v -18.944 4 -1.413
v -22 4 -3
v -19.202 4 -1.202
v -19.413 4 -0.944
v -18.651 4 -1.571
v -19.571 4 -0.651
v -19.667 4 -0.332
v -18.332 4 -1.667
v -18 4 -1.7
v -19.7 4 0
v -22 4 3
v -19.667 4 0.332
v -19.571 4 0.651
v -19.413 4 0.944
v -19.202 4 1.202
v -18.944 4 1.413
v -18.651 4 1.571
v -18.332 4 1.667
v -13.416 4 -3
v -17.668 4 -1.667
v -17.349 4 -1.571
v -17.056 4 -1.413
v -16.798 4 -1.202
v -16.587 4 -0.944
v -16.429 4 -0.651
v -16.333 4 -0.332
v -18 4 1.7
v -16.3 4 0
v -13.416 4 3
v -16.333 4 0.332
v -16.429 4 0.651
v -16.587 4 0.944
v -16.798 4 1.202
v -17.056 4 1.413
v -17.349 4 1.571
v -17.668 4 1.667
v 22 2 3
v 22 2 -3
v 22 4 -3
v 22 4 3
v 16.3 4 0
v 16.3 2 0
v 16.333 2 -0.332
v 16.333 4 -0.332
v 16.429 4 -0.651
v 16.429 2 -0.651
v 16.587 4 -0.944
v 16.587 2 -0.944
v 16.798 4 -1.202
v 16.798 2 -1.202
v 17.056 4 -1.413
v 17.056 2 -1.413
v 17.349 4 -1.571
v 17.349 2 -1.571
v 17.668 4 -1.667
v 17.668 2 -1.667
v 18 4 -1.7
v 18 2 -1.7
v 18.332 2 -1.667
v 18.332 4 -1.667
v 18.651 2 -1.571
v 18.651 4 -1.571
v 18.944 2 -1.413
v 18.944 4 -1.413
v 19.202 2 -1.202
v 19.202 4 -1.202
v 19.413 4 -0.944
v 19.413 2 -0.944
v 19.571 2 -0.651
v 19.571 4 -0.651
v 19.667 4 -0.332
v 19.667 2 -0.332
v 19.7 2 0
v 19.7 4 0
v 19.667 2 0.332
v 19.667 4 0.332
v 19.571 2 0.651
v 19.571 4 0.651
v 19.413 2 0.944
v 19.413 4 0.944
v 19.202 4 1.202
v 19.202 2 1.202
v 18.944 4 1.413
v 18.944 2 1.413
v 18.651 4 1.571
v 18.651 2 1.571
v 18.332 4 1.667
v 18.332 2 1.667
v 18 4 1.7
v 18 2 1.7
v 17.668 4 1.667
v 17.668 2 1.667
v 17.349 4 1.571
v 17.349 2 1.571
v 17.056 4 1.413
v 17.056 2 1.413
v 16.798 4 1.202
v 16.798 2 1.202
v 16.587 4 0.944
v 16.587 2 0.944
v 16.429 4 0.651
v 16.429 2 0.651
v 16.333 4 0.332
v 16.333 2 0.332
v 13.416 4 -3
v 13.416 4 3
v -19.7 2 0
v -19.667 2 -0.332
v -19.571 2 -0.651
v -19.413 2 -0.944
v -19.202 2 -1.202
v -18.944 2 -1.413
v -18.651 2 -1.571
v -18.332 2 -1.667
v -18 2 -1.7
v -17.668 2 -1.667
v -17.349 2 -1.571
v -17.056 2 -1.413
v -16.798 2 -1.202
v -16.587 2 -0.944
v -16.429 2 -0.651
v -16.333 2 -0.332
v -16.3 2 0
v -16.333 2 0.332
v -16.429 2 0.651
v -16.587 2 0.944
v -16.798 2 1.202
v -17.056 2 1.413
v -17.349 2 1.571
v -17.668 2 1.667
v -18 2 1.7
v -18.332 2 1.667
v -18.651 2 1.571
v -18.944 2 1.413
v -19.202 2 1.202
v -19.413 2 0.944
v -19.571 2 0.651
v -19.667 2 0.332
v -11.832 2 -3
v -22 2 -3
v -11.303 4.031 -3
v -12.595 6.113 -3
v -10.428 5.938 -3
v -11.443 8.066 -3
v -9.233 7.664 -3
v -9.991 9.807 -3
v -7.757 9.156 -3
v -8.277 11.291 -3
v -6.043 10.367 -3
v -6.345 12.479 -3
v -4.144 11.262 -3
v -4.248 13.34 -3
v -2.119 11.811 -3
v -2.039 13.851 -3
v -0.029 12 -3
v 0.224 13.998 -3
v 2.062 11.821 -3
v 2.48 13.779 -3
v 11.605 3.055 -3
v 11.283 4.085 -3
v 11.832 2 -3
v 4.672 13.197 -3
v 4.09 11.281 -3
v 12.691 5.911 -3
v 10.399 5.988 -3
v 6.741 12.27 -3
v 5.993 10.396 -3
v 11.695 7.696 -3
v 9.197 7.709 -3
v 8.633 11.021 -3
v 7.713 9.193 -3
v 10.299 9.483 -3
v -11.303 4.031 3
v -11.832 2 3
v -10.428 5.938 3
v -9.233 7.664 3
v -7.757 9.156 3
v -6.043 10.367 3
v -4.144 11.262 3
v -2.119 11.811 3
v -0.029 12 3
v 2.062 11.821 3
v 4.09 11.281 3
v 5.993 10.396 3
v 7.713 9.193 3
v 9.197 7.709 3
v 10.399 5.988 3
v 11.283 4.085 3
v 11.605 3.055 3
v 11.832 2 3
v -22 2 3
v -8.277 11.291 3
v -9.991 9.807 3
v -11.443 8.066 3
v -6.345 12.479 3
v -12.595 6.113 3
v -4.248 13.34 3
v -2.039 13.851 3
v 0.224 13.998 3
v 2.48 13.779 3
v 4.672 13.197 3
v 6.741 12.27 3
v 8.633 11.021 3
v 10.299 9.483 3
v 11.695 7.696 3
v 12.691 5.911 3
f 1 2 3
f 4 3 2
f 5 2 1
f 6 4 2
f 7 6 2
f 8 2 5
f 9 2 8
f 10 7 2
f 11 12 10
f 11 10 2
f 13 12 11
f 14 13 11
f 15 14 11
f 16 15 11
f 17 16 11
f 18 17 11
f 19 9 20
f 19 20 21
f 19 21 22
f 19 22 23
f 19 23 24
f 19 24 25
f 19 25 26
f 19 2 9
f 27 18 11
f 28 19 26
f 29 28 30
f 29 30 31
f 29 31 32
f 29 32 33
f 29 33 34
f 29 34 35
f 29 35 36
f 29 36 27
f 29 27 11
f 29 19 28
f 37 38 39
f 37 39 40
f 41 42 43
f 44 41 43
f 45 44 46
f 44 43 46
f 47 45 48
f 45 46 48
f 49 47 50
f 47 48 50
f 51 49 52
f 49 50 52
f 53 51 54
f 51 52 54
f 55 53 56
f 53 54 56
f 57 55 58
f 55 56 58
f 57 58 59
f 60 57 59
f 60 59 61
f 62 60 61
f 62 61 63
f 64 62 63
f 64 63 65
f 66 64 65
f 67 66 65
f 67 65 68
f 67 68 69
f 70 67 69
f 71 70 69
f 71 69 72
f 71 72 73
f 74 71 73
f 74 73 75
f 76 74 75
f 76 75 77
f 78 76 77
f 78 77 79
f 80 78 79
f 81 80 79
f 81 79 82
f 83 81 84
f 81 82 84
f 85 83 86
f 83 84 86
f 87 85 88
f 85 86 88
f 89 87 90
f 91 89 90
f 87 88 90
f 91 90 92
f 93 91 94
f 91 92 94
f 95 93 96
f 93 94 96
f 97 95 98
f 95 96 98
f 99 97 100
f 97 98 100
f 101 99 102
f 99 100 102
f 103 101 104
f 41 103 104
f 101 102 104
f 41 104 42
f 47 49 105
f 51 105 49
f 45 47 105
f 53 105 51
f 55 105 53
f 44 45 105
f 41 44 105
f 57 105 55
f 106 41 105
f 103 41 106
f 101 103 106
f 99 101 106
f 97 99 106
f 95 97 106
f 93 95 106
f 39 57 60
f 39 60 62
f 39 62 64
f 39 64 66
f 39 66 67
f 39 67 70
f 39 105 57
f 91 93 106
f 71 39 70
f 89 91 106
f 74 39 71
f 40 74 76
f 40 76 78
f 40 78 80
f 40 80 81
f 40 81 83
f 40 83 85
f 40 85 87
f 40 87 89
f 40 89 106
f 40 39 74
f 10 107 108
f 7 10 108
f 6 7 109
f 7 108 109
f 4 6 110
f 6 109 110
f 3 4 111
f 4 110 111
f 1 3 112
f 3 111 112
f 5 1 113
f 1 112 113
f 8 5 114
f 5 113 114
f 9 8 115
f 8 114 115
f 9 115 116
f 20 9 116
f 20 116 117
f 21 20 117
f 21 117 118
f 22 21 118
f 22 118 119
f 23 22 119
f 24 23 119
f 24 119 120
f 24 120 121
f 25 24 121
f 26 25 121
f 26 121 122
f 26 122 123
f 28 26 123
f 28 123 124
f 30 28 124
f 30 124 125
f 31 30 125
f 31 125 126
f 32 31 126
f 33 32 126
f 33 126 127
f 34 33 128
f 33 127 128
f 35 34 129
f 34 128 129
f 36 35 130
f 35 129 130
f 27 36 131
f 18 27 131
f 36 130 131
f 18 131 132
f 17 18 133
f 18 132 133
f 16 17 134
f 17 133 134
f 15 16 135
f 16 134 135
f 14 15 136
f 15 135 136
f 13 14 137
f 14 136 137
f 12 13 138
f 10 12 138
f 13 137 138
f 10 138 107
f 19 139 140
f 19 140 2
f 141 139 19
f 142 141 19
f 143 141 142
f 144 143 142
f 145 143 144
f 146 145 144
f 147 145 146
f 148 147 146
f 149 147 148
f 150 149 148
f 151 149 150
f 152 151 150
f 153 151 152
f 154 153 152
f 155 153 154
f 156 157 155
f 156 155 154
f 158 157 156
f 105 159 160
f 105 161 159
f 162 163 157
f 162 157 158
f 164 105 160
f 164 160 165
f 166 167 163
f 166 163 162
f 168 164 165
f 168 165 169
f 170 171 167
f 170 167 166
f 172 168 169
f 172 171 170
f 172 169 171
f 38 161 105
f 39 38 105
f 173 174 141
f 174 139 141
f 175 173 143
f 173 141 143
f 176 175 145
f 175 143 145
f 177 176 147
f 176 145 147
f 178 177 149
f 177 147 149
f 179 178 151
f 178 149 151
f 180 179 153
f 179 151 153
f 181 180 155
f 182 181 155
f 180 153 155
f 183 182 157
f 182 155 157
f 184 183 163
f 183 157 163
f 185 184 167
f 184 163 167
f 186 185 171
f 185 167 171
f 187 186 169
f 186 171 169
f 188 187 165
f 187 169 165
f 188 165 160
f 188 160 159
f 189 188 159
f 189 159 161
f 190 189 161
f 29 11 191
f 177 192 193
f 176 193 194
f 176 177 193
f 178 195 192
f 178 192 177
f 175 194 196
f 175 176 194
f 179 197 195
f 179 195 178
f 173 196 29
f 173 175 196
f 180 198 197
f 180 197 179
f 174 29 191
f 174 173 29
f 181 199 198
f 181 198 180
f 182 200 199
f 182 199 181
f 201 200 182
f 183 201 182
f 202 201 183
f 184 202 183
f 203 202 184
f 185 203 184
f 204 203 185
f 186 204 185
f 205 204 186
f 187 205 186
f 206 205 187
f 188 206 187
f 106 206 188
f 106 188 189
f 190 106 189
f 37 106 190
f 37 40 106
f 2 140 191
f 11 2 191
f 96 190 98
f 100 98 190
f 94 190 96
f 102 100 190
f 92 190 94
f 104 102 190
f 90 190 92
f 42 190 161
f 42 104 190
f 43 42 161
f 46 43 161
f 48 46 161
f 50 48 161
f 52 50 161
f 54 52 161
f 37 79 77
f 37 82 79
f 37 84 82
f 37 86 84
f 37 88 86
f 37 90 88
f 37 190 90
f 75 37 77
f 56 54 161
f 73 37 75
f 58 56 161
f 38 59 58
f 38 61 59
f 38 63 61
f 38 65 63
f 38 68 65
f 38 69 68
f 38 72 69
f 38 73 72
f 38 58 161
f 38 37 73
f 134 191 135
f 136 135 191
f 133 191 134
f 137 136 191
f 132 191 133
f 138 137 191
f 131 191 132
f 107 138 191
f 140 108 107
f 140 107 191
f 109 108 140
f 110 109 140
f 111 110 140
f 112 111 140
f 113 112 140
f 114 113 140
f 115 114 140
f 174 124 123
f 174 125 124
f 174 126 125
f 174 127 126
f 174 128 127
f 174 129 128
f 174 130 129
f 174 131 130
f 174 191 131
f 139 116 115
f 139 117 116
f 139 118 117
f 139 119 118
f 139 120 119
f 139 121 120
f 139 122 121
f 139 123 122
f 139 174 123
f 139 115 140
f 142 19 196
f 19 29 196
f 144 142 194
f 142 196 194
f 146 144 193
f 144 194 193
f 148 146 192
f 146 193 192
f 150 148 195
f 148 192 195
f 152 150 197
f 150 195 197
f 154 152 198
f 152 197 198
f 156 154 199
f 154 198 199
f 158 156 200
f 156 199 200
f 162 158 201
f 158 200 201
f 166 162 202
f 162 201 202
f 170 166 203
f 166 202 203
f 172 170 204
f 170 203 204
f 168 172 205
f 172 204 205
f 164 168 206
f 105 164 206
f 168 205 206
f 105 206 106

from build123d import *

# Parameters (mm, degrees)
SKETCH_2_W         = 6
SKETCH_2_H         = 2
HOLE_WIZARD_M3_1_D = 3.4


with BuildPart() as part:
    # 掃出1: sweep along a path in 草圖1
    with BuildLine(Plane.XY) as sweep_1_path:
        Line((-22, 2), (-11.832159566, 2))
        ThreePointArc((-11.832159566, 2), (0, 12), (11.832159566, 2))
        Line((11.832159566, 2), (22, 2))
    # 草圖2 → 掃出1 (sweep)
    with BuildSketch(Plane(origin=(22, 0, 0), x_dir=(0, 0, -1), z_dir=(1, 0, 0))):
        with Locations((0, 3)):
            Rectangle(SKETCH_2_W, SKETCH_2_H)
    sweep(path=sweep_1_path.line, transition=Transition.RIGHT)

    # M3 餘隙孔1 (through all)
    with Locations(Plane(origin=(0, 4, 0), x_dir=(1, 0, 0), z_dir=(0, 1, 0))):
        with Locations((-18, 0), (18, 0)):
            Hole(HOLE_WIZARD_M3_1_D / 2)


solid = part.part
